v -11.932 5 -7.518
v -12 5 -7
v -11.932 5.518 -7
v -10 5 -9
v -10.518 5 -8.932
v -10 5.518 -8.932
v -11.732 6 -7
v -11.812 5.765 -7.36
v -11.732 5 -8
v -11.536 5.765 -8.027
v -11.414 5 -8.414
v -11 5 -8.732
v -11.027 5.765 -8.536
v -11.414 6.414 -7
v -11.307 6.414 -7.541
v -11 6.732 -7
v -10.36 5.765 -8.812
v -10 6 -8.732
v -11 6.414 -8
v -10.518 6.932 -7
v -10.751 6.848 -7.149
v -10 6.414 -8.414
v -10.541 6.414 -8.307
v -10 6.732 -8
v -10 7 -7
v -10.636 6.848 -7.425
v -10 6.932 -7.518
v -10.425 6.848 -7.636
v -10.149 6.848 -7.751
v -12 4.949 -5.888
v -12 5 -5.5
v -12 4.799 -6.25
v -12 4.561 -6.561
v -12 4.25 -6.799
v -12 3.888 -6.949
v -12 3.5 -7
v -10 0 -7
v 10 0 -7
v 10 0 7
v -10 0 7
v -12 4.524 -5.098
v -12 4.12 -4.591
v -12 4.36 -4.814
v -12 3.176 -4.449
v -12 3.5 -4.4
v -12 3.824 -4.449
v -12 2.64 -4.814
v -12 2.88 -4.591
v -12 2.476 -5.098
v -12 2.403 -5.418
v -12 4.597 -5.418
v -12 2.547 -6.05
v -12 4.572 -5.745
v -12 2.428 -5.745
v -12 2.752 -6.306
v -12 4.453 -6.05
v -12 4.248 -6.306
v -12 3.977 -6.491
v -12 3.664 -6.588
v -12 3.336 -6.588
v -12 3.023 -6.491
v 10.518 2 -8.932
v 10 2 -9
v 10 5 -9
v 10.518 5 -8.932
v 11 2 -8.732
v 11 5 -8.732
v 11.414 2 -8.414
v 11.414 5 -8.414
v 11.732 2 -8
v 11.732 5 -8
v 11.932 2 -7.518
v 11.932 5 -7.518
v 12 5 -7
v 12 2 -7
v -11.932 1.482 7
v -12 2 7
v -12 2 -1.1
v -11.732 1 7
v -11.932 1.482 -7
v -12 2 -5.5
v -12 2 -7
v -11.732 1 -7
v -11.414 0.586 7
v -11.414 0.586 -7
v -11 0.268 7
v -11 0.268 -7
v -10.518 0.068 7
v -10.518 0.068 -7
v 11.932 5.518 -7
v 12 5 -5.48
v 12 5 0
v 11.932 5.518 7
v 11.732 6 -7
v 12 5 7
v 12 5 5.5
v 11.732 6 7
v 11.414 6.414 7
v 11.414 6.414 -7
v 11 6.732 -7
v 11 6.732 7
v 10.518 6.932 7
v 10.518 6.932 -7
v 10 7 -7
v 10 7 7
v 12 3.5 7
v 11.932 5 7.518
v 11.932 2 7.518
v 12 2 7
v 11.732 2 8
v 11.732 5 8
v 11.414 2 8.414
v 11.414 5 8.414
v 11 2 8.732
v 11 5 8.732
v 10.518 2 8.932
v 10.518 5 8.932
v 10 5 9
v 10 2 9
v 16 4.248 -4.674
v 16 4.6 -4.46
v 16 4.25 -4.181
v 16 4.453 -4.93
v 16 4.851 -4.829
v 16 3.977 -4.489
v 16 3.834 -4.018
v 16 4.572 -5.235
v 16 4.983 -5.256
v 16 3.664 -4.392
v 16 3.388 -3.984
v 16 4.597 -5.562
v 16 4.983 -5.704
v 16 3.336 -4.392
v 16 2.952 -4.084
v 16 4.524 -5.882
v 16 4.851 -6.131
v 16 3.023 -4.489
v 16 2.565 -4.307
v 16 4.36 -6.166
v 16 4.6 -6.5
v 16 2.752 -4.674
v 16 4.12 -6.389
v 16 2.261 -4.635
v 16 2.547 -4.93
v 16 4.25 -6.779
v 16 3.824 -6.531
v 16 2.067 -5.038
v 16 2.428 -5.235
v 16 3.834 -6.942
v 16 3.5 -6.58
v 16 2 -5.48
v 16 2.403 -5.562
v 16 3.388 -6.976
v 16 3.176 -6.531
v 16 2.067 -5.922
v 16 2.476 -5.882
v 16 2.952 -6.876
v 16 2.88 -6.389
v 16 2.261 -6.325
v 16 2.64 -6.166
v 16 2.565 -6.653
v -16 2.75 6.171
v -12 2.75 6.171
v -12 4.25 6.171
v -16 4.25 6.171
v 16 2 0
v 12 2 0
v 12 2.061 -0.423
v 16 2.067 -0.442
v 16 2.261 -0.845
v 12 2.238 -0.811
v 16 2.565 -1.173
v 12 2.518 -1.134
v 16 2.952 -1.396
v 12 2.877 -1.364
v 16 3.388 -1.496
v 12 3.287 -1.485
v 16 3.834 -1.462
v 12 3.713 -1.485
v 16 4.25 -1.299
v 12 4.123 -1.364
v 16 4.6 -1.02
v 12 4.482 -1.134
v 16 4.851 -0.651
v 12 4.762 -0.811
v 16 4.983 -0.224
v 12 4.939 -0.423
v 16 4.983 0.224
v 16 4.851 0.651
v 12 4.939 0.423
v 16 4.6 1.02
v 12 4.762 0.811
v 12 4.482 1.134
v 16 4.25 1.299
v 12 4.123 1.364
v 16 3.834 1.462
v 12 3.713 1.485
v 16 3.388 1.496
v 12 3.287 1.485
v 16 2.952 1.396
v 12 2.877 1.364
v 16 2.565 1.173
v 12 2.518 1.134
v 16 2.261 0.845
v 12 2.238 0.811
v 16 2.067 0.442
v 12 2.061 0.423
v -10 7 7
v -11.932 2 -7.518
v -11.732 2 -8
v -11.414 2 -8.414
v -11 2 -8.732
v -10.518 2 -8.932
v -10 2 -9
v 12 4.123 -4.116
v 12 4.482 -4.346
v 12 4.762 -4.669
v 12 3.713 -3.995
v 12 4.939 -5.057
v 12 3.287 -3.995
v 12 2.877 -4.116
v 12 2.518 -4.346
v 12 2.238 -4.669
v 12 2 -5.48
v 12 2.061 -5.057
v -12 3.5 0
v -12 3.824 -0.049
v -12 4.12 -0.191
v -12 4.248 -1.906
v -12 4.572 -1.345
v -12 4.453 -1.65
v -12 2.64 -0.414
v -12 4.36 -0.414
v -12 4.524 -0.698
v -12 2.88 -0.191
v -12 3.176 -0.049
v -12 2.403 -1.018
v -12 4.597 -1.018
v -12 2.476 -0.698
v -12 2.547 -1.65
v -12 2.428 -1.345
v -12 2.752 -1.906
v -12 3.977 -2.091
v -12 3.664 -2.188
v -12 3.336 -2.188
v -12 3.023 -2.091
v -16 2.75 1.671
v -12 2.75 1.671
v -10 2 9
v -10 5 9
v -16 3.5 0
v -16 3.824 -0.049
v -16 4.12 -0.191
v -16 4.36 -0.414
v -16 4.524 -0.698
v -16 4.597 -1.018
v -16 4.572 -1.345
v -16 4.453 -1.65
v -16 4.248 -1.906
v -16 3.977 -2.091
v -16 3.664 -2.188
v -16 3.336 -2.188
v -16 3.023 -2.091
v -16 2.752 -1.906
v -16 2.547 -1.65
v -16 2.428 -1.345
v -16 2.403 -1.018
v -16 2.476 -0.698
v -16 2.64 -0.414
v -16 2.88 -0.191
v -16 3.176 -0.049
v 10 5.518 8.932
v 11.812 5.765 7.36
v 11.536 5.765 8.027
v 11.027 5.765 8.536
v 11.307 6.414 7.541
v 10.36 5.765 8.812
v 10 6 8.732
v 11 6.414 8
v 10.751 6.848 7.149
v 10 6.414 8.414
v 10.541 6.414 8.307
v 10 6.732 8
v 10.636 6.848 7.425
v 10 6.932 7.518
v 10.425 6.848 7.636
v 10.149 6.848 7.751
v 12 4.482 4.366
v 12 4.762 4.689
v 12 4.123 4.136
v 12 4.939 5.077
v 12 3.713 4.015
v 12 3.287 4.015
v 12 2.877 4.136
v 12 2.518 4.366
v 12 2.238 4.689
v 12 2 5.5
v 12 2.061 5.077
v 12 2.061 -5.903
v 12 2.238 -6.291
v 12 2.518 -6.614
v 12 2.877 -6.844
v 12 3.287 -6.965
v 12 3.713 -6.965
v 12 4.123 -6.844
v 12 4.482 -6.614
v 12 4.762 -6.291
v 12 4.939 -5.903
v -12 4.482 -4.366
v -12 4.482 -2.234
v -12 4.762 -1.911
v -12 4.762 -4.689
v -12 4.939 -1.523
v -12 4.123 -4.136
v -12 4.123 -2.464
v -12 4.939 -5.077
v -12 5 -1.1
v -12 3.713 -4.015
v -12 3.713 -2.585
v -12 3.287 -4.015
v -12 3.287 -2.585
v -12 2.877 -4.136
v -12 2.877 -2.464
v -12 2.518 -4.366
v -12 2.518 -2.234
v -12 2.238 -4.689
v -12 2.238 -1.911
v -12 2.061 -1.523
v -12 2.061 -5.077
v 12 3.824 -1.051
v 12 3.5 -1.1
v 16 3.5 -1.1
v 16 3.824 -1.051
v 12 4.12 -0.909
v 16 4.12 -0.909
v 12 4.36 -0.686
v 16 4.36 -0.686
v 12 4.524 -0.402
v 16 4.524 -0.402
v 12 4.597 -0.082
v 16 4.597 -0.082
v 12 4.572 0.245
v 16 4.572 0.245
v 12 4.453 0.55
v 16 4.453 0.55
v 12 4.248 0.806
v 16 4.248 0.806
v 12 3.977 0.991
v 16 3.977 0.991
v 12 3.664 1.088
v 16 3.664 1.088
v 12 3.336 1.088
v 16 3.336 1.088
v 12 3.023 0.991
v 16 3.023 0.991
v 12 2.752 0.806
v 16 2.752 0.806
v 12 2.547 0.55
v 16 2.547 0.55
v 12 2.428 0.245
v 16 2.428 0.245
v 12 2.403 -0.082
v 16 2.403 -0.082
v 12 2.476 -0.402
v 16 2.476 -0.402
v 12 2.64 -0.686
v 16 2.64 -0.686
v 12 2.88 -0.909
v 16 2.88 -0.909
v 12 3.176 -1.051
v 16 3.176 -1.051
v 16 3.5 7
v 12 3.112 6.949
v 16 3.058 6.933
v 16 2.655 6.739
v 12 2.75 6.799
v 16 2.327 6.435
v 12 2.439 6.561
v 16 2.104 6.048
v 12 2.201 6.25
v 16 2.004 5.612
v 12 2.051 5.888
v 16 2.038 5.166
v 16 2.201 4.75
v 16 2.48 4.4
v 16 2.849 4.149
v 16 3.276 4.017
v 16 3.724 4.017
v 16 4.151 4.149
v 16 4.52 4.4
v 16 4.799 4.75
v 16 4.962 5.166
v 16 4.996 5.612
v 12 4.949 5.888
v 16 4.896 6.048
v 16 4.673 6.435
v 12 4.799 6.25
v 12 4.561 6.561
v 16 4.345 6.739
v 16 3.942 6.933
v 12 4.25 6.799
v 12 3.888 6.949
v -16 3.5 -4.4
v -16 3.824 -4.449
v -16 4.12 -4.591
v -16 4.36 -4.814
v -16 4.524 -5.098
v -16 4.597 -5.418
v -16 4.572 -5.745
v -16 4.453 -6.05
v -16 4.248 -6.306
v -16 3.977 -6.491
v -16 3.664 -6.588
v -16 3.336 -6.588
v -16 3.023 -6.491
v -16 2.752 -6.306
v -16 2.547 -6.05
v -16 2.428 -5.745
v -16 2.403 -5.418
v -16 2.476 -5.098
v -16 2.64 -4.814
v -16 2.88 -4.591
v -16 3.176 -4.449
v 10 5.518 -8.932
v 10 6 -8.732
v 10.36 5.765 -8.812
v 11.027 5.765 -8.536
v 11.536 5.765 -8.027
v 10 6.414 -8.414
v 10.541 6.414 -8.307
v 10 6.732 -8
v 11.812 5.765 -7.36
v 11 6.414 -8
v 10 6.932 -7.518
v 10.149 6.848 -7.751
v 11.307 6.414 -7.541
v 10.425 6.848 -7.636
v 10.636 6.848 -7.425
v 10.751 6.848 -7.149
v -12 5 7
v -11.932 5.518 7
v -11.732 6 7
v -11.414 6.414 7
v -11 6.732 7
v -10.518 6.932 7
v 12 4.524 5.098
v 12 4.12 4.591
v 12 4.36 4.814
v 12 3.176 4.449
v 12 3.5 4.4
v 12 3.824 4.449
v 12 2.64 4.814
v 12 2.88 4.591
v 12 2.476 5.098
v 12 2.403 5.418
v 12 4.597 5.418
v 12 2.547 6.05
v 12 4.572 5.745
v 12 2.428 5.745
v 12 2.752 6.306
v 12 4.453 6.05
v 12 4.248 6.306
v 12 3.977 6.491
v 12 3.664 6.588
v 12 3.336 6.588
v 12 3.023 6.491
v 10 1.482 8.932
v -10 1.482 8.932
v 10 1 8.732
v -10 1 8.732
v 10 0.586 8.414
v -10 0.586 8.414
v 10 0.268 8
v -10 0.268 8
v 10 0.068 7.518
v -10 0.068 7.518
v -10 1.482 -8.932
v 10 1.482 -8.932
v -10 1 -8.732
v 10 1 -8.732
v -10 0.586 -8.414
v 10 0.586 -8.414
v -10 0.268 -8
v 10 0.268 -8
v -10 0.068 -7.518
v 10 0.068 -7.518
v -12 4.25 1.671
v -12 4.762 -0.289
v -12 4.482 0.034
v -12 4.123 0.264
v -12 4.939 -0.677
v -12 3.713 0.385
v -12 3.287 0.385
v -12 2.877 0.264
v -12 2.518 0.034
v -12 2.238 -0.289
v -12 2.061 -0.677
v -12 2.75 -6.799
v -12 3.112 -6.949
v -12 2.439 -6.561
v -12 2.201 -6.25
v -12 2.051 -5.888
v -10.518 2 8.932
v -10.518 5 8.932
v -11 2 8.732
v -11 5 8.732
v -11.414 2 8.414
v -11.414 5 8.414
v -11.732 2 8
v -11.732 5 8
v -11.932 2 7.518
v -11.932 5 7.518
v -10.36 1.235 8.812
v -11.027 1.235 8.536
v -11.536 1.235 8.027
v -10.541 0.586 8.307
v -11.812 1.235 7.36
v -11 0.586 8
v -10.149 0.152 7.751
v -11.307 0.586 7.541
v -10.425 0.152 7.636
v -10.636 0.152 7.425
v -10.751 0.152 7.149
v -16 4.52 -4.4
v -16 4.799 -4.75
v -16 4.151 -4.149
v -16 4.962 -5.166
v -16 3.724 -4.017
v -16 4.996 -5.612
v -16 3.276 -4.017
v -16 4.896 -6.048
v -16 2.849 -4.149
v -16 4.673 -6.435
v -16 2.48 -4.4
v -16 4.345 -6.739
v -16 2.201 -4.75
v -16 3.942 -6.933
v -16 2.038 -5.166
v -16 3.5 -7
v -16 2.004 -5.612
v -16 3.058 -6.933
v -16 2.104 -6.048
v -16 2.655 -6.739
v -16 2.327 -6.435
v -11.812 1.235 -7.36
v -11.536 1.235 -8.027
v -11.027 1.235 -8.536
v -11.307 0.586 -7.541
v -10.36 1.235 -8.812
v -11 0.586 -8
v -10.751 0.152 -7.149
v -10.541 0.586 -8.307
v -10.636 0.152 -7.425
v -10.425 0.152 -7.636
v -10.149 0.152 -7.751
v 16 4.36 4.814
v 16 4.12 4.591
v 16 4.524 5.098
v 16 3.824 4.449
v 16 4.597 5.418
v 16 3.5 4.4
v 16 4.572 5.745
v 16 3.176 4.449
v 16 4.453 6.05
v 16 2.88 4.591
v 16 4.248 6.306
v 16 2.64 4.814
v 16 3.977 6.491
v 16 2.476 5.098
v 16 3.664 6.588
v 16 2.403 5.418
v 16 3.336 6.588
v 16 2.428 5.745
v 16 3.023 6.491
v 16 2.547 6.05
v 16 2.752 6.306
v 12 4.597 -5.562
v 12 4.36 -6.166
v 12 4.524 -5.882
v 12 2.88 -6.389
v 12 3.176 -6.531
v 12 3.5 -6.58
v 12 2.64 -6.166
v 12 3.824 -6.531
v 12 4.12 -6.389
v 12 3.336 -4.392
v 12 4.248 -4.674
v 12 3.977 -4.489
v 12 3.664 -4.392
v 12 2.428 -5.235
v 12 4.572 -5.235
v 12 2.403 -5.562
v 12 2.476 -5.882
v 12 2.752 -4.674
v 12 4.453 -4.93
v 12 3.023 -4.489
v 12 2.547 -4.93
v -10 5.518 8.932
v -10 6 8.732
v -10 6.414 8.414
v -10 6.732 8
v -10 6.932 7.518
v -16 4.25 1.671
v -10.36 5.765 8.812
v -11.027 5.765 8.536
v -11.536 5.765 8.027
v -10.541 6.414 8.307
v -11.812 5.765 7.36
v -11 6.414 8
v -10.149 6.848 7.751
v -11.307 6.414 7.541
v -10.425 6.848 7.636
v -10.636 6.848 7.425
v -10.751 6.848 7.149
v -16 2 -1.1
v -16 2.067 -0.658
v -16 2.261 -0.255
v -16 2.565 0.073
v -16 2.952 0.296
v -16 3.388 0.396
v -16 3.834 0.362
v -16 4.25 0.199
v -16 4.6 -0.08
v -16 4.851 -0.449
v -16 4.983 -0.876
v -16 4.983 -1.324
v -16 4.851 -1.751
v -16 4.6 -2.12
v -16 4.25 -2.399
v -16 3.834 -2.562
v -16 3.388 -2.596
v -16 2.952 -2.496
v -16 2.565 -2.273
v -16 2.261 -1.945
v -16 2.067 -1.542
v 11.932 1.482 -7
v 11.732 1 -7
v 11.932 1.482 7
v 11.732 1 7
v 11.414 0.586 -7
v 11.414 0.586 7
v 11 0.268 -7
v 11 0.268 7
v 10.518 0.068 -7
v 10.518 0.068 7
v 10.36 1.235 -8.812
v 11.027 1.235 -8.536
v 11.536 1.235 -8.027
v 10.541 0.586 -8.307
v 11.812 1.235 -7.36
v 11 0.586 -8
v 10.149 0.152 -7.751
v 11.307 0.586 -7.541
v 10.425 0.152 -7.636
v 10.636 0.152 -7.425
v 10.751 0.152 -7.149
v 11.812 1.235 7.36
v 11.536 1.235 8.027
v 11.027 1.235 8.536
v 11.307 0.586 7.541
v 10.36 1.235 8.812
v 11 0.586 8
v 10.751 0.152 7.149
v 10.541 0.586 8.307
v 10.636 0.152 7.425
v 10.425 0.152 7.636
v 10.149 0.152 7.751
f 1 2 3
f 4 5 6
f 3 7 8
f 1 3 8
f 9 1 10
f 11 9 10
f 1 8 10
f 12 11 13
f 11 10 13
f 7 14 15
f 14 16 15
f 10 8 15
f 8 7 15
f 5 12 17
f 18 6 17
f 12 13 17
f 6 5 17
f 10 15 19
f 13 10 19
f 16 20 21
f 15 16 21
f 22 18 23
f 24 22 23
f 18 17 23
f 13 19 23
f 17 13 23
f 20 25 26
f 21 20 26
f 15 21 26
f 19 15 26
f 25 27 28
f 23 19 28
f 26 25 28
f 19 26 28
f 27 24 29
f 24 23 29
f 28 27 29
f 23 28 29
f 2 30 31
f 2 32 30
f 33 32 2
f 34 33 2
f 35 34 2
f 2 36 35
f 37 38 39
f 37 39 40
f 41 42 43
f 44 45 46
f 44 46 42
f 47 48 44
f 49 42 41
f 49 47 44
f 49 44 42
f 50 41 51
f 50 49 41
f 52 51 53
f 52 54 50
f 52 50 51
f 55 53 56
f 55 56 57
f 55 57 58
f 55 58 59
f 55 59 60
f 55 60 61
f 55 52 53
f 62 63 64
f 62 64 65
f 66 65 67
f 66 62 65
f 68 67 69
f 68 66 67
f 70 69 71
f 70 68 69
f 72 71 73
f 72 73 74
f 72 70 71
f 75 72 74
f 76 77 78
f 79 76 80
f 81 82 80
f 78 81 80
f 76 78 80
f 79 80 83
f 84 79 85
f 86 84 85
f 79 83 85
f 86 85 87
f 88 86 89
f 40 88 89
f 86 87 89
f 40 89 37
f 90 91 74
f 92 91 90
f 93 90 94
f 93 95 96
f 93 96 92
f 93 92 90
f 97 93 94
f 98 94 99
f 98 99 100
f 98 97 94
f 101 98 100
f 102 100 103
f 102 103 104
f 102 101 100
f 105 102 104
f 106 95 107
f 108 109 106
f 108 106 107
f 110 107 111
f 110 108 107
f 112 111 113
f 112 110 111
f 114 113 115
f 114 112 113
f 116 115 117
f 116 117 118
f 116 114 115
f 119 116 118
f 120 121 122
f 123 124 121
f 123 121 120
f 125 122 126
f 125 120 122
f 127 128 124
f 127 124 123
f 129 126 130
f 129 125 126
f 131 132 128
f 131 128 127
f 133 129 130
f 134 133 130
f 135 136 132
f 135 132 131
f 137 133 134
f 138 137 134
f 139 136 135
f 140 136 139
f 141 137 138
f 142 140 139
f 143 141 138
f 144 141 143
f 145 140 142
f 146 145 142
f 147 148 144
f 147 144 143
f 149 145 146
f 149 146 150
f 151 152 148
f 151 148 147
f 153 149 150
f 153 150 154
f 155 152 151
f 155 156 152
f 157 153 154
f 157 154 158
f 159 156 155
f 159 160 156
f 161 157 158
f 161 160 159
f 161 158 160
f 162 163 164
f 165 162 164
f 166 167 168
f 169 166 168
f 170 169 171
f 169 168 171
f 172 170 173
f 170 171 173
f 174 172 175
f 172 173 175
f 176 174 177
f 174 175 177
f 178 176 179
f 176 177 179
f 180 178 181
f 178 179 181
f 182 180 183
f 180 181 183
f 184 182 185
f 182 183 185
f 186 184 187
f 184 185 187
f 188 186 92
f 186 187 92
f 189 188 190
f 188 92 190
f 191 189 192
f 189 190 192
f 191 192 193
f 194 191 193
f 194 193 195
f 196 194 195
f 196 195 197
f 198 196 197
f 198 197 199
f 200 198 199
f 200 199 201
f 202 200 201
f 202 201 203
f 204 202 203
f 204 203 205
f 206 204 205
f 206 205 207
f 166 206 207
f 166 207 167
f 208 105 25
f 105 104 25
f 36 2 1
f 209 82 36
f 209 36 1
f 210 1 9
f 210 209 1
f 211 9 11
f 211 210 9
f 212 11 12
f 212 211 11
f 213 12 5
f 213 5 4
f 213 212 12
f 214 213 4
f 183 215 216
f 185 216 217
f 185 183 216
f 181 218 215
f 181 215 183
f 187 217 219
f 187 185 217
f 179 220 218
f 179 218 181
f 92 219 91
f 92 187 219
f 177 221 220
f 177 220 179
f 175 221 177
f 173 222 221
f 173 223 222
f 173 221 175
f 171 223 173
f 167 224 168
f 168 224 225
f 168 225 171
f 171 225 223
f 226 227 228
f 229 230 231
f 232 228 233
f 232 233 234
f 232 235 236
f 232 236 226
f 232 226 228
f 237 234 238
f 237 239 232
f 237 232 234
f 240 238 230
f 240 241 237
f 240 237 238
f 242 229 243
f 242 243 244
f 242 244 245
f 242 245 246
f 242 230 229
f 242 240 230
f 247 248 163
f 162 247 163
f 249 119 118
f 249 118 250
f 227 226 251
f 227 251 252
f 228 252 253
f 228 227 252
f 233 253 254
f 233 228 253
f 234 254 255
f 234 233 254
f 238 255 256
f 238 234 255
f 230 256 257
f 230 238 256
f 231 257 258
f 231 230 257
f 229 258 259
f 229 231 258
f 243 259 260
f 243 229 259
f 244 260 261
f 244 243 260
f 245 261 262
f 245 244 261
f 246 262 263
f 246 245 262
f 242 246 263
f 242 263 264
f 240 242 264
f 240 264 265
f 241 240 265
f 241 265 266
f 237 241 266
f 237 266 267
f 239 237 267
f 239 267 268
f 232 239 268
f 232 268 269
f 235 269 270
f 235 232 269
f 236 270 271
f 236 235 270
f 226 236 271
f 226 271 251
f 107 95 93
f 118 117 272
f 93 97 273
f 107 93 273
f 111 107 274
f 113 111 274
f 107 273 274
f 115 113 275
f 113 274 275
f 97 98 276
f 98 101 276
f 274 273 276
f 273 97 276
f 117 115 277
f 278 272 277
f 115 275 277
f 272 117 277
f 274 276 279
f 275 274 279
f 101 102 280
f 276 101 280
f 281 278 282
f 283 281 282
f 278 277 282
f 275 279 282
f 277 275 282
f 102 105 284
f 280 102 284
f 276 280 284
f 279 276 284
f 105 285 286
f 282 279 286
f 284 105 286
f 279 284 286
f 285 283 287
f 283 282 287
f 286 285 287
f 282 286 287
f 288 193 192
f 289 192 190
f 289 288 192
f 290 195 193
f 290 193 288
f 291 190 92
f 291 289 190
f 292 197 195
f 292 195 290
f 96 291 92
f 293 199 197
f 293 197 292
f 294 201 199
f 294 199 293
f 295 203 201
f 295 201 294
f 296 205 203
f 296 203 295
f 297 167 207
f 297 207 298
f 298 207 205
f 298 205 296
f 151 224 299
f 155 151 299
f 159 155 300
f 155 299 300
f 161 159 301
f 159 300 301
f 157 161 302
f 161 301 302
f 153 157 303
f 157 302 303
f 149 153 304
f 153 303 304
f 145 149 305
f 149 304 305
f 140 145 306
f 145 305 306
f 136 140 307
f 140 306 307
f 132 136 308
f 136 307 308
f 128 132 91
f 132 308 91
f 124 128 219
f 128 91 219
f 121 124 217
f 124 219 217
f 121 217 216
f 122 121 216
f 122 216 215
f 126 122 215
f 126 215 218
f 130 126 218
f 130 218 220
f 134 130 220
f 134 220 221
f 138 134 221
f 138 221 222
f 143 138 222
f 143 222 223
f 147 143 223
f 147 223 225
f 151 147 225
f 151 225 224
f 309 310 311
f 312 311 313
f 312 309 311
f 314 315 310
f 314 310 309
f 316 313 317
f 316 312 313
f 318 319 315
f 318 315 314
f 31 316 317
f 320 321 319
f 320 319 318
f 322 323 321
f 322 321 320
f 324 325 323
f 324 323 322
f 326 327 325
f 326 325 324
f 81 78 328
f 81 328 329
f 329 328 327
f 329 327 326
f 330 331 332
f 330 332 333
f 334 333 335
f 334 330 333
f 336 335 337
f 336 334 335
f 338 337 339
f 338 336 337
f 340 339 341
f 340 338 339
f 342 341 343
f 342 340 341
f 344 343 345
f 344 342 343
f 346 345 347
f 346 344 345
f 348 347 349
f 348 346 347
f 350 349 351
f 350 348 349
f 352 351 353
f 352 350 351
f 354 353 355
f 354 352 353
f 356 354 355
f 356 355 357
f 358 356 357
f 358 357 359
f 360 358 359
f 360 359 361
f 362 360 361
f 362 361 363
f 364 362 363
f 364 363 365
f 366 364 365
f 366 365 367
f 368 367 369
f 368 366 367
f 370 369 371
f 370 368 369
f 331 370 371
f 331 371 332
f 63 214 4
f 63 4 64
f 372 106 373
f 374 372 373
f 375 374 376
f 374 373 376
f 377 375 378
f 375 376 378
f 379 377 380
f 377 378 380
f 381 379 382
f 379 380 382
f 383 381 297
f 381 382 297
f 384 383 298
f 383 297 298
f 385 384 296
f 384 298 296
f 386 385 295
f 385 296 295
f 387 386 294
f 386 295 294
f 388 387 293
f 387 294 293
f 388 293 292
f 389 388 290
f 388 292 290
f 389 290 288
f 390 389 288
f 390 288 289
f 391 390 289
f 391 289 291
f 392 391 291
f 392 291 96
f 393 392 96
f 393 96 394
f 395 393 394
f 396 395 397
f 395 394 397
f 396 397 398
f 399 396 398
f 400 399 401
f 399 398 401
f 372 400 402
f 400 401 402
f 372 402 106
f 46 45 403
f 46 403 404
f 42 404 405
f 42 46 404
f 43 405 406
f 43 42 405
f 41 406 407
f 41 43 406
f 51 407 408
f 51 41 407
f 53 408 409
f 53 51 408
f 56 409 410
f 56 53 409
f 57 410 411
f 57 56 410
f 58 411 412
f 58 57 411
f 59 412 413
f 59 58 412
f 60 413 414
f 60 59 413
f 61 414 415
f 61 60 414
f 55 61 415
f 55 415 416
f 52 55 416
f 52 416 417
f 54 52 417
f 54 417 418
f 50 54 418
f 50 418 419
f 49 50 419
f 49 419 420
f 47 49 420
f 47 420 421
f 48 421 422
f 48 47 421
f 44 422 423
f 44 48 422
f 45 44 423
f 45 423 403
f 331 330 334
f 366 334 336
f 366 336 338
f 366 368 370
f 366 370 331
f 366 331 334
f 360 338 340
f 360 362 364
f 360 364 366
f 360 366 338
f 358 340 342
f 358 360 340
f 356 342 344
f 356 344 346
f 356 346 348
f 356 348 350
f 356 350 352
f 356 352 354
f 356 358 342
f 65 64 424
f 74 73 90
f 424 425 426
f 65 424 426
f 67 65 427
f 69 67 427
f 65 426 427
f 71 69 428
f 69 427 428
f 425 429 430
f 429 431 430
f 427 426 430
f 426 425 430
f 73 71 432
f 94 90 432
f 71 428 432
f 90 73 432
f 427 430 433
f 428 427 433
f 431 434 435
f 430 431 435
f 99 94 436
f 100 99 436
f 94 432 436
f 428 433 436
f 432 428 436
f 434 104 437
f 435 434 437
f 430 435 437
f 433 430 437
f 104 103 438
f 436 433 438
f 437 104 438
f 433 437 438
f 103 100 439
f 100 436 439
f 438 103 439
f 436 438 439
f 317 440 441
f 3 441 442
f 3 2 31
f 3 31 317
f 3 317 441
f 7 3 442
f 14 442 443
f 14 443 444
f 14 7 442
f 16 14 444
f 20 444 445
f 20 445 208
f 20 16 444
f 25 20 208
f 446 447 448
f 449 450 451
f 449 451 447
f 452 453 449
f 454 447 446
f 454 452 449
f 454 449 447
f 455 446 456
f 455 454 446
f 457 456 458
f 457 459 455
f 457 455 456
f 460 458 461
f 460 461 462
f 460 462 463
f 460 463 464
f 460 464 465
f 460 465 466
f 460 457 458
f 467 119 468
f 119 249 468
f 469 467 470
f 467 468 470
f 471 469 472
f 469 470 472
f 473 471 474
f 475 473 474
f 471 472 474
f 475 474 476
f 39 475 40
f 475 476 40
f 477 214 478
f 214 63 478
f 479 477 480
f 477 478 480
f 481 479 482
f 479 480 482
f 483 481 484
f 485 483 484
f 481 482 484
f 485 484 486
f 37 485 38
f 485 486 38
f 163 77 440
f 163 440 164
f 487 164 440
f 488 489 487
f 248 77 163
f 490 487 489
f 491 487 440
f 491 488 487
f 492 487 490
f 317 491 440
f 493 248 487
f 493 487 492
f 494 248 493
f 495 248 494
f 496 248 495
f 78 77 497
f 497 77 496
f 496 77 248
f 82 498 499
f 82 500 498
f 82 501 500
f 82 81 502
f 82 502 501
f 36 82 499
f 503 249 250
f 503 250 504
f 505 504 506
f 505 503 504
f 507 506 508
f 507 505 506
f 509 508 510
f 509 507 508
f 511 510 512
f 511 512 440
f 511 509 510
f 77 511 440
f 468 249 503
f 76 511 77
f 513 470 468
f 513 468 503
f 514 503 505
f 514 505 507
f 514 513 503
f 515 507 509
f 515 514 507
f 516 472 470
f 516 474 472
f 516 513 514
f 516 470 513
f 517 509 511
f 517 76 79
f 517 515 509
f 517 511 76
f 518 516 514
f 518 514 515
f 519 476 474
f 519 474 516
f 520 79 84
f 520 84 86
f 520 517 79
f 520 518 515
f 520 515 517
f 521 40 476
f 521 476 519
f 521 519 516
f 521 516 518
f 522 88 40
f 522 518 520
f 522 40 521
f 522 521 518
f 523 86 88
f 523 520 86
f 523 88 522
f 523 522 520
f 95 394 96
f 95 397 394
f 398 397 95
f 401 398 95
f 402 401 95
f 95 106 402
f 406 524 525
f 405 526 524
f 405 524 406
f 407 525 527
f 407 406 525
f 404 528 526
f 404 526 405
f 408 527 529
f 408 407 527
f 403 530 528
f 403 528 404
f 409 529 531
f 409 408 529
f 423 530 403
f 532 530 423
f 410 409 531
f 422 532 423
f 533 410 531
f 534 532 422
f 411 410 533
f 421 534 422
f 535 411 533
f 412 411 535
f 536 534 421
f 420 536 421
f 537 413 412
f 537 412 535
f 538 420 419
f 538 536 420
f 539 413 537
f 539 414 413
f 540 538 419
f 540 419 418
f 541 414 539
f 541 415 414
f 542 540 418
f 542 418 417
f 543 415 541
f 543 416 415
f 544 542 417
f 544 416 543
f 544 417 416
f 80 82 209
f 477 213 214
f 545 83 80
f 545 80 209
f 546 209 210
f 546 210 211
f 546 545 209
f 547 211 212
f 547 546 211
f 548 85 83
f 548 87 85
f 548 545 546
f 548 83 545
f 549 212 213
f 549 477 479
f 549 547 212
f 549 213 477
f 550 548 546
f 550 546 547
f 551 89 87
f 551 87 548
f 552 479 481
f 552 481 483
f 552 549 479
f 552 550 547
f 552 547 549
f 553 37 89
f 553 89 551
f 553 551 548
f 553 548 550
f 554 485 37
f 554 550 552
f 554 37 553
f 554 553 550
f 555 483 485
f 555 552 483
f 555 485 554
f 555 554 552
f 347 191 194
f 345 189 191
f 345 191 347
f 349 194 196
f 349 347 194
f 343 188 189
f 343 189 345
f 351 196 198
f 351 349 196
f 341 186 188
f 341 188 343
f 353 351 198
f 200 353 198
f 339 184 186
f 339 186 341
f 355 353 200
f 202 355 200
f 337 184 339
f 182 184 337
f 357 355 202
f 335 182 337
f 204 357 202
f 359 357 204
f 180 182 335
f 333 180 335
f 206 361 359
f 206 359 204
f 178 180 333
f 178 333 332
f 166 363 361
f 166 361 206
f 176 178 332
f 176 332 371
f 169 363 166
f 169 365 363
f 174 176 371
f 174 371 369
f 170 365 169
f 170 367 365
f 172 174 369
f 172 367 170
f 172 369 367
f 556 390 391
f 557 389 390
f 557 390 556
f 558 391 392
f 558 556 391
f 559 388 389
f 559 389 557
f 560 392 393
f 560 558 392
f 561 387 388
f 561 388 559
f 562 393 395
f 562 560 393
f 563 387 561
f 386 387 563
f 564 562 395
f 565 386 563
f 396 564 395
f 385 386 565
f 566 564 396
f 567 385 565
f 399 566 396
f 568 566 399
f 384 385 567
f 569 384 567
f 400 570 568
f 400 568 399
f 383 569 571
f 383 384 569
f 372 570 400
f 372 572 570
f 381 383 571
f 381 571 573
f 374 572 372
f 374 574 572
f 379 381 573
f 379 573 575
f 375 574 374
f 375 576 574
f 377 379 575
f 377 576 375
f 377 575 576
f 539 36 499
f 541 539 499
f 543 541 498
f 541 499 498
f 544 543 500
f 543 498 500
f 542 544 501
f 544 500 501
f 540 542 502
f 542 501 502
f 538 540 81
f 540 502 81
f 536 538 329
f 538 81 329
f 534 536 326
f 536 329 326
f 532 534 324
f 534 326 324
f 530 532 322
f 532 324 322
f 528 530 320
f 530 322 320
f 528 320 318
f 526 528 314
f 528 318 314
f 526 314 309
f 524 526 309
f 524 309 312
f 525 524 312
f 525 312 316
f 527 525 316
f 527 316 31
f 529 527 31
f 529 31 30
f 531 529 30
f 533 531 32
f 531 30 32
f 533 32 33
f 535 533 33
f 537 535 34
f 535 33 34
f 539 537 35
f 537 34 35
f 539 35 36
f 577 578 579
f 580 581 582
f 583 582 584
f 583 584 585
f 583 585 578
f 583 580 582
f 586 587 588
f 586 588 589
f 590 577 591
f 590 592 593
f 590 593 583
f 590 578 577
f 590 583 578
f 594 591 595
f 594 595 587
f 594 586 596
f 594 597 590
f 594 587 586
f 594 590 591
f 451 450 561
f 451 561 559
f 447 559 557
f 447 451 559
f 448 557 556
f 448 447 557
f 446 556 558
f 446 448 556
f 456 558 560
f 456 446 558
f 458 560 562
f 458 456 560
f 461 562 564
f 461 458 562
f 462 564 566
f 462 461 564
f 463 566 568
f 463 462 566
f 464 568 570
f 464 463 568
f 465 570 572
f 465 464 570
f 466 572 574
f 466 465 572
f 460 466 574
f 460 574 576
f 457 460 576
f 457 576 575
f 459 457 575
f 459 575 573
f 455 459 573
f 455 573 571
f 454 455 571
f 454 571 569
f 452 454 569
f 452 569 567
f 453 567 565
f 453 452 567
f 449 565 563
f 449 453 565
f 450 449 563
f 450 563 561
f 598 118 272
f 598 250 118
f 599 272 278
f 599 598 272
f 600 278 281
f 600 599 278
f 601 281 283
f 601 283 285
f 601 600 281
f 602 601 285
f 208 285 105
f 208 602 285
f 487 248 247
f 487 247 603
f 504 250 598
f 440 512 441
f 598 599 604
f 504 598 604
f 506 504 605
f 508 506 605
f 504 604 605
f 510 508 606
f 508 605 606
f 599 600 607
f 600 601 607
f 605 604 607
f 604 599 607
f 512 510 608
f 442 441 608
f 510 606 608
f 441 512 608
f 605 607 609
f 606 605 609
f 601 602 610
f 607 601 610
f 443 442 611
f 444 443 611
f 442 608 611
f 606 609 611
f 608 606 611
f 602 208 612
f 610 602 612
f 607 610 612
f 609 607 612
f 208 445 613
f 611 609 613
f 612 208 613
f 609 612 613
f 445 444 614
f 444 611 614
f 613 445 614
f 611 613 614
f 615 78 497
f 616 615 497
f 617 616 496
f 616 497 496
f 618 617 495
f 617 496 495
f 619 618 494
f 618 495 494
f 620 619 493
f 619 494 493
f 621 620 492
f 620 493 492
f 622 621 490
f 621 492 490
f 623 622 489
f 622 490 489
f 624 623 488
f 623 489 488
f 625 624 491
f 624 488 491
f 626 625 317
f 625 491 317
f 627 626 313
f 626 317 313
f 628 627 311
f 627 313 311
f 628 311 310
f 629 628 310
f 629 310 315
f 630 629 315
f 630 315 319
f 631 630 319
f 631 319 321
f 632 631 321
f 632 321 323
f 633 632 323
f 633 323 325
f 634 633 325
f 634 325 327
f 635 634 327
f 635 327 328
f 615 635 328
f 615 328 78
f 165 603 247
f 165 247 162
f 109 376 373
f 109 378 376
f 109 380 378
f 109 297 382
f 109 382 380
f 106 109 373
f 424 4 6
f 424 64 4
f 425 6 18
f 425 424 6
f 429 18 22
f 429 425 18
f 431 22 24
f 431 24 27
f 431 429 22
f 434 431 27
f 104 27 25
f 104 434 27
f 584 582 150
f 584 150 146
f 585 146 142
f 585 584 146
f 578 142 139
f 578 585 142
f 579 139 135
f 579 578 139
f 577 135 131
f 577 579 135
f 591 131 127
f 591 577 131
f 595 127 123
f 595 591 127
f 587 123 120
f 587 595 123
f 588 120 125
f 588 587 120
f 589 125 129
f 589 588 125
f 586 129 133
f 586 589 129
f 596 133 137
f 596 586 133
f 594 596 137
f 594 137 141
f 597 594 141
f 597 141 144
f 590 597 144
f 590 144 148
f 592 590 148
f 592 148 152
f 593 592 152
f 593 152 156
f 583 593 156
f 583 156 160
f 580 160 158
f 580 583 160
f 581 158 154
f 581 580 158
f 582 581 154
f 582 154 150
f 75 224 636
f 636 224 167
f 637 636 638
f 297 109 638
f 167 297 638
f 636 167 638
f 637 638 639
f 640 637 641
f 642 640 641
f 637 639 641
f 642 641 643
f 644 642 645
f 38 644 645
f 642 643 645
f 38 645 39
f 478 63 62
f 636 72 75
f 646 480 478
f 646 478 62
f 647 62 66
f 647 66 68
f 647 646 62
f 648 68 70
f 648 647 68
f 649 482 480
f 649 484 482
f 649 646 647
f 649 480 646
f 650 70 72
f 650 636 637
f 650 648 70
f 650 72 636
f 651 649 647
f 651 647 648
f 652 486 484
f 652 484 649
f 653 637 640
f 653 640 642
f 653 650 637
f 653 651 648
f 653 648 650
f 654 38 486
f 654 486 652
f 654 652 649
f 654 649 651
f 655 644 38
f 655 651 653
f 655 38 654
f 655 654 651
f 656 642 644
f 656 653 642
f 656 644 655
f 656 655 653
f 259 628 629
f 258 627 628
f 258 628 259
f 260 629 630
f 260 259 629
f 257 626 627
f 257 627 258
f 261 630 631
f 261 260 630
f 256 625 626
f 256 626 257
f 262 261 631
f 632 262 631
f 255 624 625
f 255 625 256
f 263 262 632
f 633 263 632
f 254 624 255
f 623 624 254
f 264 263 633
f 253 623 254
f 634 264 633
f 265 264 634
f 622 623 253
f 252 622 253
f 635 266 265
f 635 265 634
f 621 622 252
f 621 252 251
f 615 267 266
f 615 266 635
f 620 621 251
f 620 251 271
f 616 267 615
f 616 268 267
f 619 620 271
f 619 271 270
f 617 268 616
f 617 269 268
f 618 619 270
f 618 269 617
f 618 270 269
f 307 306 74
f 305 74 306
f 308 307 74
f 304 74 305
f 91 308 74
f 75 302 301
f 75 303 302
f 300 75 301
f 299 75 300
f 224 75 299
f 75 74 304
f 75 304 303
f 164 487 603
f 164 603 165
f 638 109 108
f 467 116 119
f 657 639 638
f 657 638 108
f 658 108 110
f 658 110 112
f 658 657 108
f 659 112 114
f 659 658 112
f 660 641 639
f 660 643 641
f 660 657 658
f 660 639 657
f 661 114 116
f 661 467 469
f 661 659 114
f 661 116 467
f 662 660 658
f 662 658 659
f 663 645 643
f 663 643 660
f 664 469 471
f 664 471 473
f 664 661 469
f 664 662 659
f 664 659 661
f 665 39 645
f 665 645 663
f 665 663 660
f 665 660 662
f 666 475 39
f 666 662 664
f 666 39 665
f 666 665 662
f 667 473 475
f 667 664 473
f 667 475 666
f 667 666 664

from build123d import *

# Parameters (mm, degrees)
BOSS_EXTRUDE1_DEPTH = 7
FILLET1_R           = 2
SKETCH2_R           = 1.5
SKETCH2_R_2         = 1.1
BOSS_EXTRUDE2_DEPTH = 4
SKETCH3_R           = 1.5
SKETCH3_R_2         = 1.1
SKETCH3_W           = 4.5
SKETCH3_H           = 1.5
BOSS_EXTRUDE3_DEPTH = 4


with BuildPart() as part:
    # Sketch1 → Boss-Extrude1 (new body)
    with BuildSketch(Plane(origin=(0, 0, 0), x_dir=(1, 0, 0), z_dir=(0, 1, 0))):
        with BuildLine():
            Line((-10, 9), (10, 9))
            ThreePointArc((10, 9), (11.414213562, 8.414213562), (12, 7))
            Line((12, 7), (12, -7))
            ThreePointArc((12, -7), (11.414213562, -8.414213562), (10, -9))
            Line((10, -9), (-10, -9))
            ThreePointArc((-10, -9), (-11.414213562, -8.414213562), (-12, -7))
            Line((-12, -7), (-12, 7))
            ThreePointArc((-12, 7), (-11.414213562, 8.414213562), (-10, 9))
        make_face()
    extrude(amount=BOSS_EXTRUDE1_DEPTH)

    # Fillet1
    fillet1_edges = [part.edges().sort_by_distance(p)[0] for p in [
        (12, 0, 0),
        (11.414213562, 0, 8.414213562),
        (0, 0, 9),
        (-11.414213562, 0, 8.414213562),
        (11.414213562, 7, 8.414213562),
        (12, 7, 0),
        (11.414213562, 7, -8.414213562),
        (0, 7, -9),
        (-11.414213562, 7, -8.414213562),
        (-12, 7, 0),
        (-11.414213562, 7, 8.414213562),
        (-12, 0, 0),
        (0, 7, 9),
        (-11.414213562, 0, -8.414213562),
        (0, 0, -9),
        (11.414213562, 0, -8.414213562),
    ]]
    fillet(fillet1_edges, radius=FILLET1_R)

    # Sketch2 → Boss-Extrude2 (add)
    # profile 1 of 3: a face of its own
    with BuildSketch(Plane(origin=(12, 0, 0), x_dir=(0, 0, -1), z_dir=(1, 0, 0))):
        with Locations(Location((0, 3.5, 0), (0, 0, 270))):
            Circle(SKETCH2_R)
        with Locations((0, 3.5)):
            Circle(SKETCH2_R_2, mode=Mode.SUBTRACT)
    # profile 2 of 3: a face of its own
    with BuildSketch(Plane(origin=(12, 0, 0), x_dir=(0, 0, -1), z_dir=(1, 0, 0))):
        with Locations(Location((-5.5, 3.5, 0), (0, 0, 180))):
            Circle(SKETCH2_R)
        with Locations((-5.5, 3.5)):
            Circle(SKETCH2_R_2, mode=Mode.SUBTRACT)
    # profile 3 of 3: a face of its own
    with BuildSketch(Plane(origin=(12, 0, 0), x_dir=(0, 0, -1), z_dir=(1, 0, 0))):
        with Locations(Location((5.479960671, 3.5, 0), (0, 0, 270))):
            Circle(SKETCH2_R)
        with Locations((5.479960671, 3.5)):
            Circle(SKETCH2_R_2, mode=Mode.SUBTRACT)
    extrude(amount=BOSS_EXTRUDE2_DEPTH)

    # Sketch3 → Boss-Extrude3 (add)
    # profile 1 of 3: a face of its own
    with BuildSketch(Plane.ZY.offset(12)):
        with Locations(Location((-5.5, 3.5, 0), (0, 0, 180))):
            Circle(SKETCH3_R)
        with Locations((-5.5, 3.5)):
            Circle(SKETCH3_R_2, mode=Mode.SUBTRACT)
    # profile 2 of 3: a face of its own
    with BuildSketch(Plane.ZY.offset(12)):
        with Locations(Location((-1.1, 3.5, 0), (0, 0, 270))):
            Circle(SKETCH3_R)
        with Locations((-1.1, 3.5)):
            Circle(SKETCH3_R_2, mode=Mode.SUBTRACT)
    # profile 3 of 3: a face of its own
    with BuildSketch(Plane.ZY.offset(12)):
        with Locations((3.921006342, 3.5)):
            Rectangle(SKETCH3_W, SKETCH3_H)
    extrude(amount=BOSS_EXTRUDE3_DEPTH)


solid = part.part
